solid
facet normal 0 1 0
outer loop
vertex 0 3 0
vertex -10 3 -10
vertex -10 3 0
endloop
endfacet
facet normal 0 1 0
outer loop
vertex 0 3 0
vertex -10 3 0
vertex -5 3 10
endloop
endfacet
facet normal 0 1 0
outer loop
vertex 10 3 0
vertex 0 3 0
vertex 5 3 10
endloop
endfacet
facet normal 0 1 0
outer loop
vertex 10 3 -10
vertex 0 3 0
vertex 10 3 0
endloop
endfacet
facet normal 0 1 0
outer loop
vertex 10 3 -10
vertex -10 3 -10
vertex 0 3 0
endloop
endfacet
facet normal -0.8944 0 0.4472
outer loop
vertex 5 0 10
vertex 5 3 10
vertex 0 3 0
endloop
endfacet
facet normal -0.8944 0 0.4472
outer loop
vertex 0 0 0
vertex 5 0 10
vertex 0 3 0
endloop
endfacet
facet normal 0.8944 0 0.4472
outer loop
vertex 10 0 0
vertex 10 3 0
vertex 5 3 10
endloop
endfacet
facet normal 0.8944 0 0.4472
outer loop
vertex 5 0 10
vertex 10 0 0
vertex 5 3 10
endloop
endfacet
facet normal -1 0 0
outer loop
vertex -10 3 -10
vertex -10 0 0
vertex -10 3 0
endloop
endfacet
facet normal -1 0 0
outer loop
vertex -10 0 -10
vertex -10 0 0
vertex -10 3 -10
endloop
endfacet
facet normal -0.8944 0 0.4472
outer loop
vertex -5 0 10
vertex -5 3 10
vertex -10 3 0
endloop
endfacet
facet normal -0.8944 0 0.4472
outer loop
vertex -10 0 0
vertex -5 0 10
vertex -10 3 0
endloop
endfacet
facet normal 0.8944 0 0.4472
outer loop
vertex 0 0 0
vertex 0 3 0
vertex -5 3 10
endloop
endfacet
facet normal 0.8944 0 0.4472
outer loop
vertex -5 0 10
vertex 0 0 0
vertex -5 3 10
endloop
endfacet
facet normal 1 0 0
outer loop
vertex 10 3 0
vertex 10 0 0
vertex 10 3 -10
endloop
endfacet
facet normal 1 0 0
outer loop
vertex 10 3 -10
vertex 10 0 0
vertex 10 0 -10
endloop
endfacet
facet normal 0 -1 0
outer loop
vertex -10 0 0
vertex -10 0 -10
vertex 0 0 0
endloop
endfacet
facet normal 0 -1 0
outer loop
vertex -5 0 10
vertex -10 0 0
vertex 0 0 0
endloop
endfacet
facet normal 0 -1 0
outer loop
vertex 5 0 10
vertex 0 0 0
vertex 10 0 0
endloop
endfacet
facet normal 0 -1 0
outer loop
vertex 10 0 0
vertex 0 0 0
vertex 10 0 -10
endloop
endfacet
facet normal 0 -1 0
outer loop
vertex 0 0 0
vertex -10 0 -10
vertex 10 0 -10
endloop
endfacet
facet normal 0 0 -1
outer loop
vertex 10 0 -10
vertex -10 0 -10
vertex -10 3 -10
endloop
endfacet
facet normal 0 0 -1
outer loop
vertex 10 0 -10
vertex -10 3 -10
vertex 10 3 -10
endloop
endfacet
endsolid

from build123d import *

# Parameters (mm, degrees)
SKETCH1_W               = 20
SKETCH1_H               = 20
BOSS_EXTRUDE1_DEPTH     = 3
CUT_EXTRUDE1_DEPTH      = 1
CUT_EXTRUDE1_DEPTH_BACK = 4


with BuildPart() as part:
    # Sketch1 → Boss-Extrude1 (new body)
    with BuildSketch(Plane(origin=(0, 0, 0), x_dir=(1, 0, 0), z_dir=(0, 1, 0))):
        Rectangle(SKETCH1_W, SKETCH1_H)
    extrude(amount=BOSS_EXTRUDE1_DEPTH)

    # Sketch2 → Cut-Extrude1 (cut, two sides)
    with BuildSketch(Plane(origin=(0, 3, 0), x_dir=(1, 0, 0), z_dir=(0, 1, 0))) as cut_extrude1_sk:
        Polygon((-5, -10), (-10, 0), (-10, -10), align=None)
        Polygon((0, 0), (-5, -10), (5, -10), align=None)
        Polygon((10, 0), (5, -10), (10, -10), align=None)
    extrude(amount=CUT_EXTRUDE1_DEPTH, mode=Mode.SUBTRACT)
    extrude(cut_extrude1_sk.sketch, amount=-CUT_EXTRUDE1_DEPTH_BACK, mode=Mode.SUBTRACT)


solid = part.part
